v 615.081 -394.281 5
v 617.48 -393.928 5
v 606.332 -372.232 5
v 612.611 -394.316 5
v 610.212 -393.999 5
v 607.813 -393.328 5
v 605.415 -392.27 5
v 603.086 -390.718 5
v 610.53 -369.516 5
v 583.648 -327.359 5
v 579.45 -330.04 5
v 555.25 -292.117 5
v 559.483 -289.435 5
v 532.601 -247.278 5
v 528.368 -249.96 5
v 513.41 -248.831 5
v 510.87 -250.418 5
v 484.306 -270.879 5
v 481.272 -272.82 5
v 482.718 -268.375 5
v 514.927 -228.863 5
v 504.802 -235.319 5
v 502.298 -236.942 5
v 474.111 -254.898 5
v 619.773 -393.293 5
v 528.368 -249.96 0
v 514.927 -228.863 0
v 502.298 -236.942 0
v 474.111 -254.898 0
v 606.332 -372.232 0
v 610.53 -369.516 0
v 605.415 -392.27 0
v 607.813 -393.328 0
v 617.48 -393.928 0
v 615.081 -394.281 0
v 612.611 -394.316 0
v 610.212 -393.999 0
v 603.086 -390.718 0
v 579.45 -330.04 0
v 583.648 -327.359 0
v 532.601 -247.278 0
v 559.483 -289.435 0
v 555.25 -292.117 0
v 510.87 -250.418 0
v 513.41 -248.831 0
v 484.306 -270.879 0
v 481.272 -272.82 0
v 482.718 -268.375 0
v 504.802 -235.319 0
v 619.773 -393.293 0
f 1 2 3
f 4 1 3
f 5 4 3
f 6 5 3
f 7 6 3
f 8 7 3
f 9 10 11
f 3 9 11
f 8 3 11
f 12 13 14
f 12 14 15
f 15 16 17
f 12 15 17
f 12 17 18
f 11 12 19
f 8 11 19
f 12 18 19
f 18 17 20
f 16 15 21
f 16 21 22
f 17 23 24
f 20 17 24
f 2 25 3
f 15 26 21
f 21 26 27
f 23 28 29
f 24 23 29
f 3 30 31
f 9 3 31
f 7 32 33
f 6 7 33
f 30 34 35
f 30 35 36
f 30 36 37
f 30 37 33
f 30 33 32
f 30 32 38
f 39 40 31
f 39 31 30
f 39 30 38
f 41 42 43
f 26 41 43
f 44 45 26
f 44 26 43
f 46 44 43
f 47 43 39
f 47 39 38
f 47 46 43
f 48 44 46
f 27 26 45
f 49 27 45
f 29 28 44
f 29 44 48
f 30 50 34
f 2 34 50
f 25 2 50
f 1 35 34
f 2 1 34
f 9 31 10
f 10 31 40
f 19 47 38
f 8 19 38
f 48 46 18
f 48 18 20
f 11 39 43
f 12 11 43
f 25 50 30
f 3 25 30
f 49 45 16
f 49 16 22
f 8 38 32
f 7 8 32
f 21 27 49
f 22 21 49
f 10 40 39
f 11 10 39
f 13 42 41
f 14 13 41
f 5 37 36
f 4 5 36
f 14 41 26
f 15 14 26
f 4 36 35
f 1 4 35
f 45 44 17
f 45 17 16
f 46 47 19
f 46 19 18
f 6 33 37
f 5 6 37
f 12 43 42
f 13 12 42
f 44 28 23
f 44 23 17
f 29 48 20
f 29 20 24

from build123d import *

# Parameters (mm, degrees)
PAD010_DEPTH = 5


with BuildPart() as part:
    # Sketch011 → Pad010 (new body)
    with BuildSketch(Plane.XY):
        with BuildLine():
            add(Edge.make_bspline(
                [(502.297598, -236.942104), (510.870098, -250.418215)],
                knots=[0, 0, 45.273944, 45.273944], degree=1))
            add(Edge.make_bspline(
                [(510.870098, -250.418215), (513.410098, -248.830715)],
                knots=[0, 0, 8.490583, 8.490583], degree=1))
            add(Edge.make_bspline(
                [(513.410098, -248.830715), (504.80232, -235.319326)],
                knots=[0, 0, 45.412003, 45.412003], degree=1))
            add(Edge.make_bspline(
                [(514.927042, -228.863493), (504.80232, -235.319326)],
                knots=[0, 0, 34.03792, 34.03792], degree=1))
            add(Edge.make_bspline(
                [(528.367875, -249.959603), (514.927042, -228.863493)],
                knots=[0, 0, 70.905924, 70.905924], degree=1))
            add(Edge.make_bspline(
                [(532.601208, -247.278492), (528.367875, -249.959603)],
                knots=[0, 0, 14.204225, 14.204225], degree=1))
            add(Edge.make_bspline(
                [(559.482874, -289.435436), (532.601208, -247.278492)],
                knots=[0, 0, 141.72752, 141.72752], degree=1))
            add(Edge.make_bspline(
                [(555.249541, -292.116547), (559.482874, -289.435436)],
                knots=[0, 0, 14.204225, 14.204225], degree=1))
            add(Edge.make_bspline(
                [(579.450096, -330.040157), (555.249541, -292.116547)],
                knots=[0, 0, 127.52337, 127.52337], degree=1))
            add(Edge.make_bspline(
                [(583.648152, -327.359046), (579.450096, -330.040157)],
                knots=[0, 0, 14.119844, 14.119844], degree=1))
            add(Edge.make_bspline(
                [(610.529818, -369.51599), (583.648152, -327.359046)],
                knots=[0, 0, 141.72752, 141.72752], degree=1))
            add(Edge.make_bspline(
                [(606.331762, -372.232379), (610.529818, -369.51599)],
                knots=[0, 0, 14.17392, 14.17392], degree=1))
            add(Edge.make_bspline(
                [(619.772595, -393.293211), (606.331762, -372.232379)],
                knots=[0, 0, 70.821607, 70.821607], degree=1))
            add(Edge.make_bspline(
                [(617.47954, -393.928211), (619.772595, -393.293211)],
                knots=[0, 0, 6.744627, 6.744627], degree=1))
            add(Edge.make_bspline(
                [(615.080651, -394.280989), (617.47954, -393.928211)],
                knots=[0, 0, 6.873136, 6.873136], degree=1))
            add(Edge.make_bspline(
                [(612.611207, -394.316267), (615.080651, -394.280989)],
                knots=[0, 0, 7.000714, 7.000714], degree=1))
            add(Edge.make_bspline(
                [(610.212318, -393.998767), (612.611207, -394.316267)],
                knots=[0, 0, 6.8593, 6.8593], degree=1))
            add(Edge.make_bspline(
                [(607.813429, -393.328489), (610.212318, -393.998767)],
                knots=[0, 0, 7.060453, 7.060453], degree=1))
            add(Edge.make_bspline(
                [(605.41454, -392.270156), (607.813429, -393.328489)],
                knots=[0, 0, 7.432362, 7.432362], degree=1))
            add(Edge.make_bspline(
                [(603.086207, -390.717934), (605.41454, -392.270156)],
                knots=[0, 0, 7.932213, 7.932213], degree=1))
            add(Edge.make_bspline(
                [(481.272043, -272.819603), (603.086207, -390.717934)],
                knots=[0, 0, 480.543161, 480.543161], degree=1))
            add(Edge.make_bspline(
                [(481.272043, -272.819603), (484.305932, -270.879325)],
                knots=[0, 0, 10.20833, 10.20833], degree=1))
            add(Edge.make_bspline(
                [(484.305932, -270.879325), (482.718432, -268.374603)],
                knots=[0, 0, 8.40595, 8.40595], degree=1))
            add(Edge.make_bspline(
                [(482.718432, -268.374603), (474.110654, -254.898492)],
                knots=[0, 0, 45.327696, 45.327696], degree=1))
            add(Edge.make_bspline(
                [(502.297598, -236.942104), (474.110654, -254.898492)],
                knots=[0, 0, 94.735527, 94.735527], degree=1))
        make_face()
    extrude(amount=PAD010_DEPTH)


solid = part.part
